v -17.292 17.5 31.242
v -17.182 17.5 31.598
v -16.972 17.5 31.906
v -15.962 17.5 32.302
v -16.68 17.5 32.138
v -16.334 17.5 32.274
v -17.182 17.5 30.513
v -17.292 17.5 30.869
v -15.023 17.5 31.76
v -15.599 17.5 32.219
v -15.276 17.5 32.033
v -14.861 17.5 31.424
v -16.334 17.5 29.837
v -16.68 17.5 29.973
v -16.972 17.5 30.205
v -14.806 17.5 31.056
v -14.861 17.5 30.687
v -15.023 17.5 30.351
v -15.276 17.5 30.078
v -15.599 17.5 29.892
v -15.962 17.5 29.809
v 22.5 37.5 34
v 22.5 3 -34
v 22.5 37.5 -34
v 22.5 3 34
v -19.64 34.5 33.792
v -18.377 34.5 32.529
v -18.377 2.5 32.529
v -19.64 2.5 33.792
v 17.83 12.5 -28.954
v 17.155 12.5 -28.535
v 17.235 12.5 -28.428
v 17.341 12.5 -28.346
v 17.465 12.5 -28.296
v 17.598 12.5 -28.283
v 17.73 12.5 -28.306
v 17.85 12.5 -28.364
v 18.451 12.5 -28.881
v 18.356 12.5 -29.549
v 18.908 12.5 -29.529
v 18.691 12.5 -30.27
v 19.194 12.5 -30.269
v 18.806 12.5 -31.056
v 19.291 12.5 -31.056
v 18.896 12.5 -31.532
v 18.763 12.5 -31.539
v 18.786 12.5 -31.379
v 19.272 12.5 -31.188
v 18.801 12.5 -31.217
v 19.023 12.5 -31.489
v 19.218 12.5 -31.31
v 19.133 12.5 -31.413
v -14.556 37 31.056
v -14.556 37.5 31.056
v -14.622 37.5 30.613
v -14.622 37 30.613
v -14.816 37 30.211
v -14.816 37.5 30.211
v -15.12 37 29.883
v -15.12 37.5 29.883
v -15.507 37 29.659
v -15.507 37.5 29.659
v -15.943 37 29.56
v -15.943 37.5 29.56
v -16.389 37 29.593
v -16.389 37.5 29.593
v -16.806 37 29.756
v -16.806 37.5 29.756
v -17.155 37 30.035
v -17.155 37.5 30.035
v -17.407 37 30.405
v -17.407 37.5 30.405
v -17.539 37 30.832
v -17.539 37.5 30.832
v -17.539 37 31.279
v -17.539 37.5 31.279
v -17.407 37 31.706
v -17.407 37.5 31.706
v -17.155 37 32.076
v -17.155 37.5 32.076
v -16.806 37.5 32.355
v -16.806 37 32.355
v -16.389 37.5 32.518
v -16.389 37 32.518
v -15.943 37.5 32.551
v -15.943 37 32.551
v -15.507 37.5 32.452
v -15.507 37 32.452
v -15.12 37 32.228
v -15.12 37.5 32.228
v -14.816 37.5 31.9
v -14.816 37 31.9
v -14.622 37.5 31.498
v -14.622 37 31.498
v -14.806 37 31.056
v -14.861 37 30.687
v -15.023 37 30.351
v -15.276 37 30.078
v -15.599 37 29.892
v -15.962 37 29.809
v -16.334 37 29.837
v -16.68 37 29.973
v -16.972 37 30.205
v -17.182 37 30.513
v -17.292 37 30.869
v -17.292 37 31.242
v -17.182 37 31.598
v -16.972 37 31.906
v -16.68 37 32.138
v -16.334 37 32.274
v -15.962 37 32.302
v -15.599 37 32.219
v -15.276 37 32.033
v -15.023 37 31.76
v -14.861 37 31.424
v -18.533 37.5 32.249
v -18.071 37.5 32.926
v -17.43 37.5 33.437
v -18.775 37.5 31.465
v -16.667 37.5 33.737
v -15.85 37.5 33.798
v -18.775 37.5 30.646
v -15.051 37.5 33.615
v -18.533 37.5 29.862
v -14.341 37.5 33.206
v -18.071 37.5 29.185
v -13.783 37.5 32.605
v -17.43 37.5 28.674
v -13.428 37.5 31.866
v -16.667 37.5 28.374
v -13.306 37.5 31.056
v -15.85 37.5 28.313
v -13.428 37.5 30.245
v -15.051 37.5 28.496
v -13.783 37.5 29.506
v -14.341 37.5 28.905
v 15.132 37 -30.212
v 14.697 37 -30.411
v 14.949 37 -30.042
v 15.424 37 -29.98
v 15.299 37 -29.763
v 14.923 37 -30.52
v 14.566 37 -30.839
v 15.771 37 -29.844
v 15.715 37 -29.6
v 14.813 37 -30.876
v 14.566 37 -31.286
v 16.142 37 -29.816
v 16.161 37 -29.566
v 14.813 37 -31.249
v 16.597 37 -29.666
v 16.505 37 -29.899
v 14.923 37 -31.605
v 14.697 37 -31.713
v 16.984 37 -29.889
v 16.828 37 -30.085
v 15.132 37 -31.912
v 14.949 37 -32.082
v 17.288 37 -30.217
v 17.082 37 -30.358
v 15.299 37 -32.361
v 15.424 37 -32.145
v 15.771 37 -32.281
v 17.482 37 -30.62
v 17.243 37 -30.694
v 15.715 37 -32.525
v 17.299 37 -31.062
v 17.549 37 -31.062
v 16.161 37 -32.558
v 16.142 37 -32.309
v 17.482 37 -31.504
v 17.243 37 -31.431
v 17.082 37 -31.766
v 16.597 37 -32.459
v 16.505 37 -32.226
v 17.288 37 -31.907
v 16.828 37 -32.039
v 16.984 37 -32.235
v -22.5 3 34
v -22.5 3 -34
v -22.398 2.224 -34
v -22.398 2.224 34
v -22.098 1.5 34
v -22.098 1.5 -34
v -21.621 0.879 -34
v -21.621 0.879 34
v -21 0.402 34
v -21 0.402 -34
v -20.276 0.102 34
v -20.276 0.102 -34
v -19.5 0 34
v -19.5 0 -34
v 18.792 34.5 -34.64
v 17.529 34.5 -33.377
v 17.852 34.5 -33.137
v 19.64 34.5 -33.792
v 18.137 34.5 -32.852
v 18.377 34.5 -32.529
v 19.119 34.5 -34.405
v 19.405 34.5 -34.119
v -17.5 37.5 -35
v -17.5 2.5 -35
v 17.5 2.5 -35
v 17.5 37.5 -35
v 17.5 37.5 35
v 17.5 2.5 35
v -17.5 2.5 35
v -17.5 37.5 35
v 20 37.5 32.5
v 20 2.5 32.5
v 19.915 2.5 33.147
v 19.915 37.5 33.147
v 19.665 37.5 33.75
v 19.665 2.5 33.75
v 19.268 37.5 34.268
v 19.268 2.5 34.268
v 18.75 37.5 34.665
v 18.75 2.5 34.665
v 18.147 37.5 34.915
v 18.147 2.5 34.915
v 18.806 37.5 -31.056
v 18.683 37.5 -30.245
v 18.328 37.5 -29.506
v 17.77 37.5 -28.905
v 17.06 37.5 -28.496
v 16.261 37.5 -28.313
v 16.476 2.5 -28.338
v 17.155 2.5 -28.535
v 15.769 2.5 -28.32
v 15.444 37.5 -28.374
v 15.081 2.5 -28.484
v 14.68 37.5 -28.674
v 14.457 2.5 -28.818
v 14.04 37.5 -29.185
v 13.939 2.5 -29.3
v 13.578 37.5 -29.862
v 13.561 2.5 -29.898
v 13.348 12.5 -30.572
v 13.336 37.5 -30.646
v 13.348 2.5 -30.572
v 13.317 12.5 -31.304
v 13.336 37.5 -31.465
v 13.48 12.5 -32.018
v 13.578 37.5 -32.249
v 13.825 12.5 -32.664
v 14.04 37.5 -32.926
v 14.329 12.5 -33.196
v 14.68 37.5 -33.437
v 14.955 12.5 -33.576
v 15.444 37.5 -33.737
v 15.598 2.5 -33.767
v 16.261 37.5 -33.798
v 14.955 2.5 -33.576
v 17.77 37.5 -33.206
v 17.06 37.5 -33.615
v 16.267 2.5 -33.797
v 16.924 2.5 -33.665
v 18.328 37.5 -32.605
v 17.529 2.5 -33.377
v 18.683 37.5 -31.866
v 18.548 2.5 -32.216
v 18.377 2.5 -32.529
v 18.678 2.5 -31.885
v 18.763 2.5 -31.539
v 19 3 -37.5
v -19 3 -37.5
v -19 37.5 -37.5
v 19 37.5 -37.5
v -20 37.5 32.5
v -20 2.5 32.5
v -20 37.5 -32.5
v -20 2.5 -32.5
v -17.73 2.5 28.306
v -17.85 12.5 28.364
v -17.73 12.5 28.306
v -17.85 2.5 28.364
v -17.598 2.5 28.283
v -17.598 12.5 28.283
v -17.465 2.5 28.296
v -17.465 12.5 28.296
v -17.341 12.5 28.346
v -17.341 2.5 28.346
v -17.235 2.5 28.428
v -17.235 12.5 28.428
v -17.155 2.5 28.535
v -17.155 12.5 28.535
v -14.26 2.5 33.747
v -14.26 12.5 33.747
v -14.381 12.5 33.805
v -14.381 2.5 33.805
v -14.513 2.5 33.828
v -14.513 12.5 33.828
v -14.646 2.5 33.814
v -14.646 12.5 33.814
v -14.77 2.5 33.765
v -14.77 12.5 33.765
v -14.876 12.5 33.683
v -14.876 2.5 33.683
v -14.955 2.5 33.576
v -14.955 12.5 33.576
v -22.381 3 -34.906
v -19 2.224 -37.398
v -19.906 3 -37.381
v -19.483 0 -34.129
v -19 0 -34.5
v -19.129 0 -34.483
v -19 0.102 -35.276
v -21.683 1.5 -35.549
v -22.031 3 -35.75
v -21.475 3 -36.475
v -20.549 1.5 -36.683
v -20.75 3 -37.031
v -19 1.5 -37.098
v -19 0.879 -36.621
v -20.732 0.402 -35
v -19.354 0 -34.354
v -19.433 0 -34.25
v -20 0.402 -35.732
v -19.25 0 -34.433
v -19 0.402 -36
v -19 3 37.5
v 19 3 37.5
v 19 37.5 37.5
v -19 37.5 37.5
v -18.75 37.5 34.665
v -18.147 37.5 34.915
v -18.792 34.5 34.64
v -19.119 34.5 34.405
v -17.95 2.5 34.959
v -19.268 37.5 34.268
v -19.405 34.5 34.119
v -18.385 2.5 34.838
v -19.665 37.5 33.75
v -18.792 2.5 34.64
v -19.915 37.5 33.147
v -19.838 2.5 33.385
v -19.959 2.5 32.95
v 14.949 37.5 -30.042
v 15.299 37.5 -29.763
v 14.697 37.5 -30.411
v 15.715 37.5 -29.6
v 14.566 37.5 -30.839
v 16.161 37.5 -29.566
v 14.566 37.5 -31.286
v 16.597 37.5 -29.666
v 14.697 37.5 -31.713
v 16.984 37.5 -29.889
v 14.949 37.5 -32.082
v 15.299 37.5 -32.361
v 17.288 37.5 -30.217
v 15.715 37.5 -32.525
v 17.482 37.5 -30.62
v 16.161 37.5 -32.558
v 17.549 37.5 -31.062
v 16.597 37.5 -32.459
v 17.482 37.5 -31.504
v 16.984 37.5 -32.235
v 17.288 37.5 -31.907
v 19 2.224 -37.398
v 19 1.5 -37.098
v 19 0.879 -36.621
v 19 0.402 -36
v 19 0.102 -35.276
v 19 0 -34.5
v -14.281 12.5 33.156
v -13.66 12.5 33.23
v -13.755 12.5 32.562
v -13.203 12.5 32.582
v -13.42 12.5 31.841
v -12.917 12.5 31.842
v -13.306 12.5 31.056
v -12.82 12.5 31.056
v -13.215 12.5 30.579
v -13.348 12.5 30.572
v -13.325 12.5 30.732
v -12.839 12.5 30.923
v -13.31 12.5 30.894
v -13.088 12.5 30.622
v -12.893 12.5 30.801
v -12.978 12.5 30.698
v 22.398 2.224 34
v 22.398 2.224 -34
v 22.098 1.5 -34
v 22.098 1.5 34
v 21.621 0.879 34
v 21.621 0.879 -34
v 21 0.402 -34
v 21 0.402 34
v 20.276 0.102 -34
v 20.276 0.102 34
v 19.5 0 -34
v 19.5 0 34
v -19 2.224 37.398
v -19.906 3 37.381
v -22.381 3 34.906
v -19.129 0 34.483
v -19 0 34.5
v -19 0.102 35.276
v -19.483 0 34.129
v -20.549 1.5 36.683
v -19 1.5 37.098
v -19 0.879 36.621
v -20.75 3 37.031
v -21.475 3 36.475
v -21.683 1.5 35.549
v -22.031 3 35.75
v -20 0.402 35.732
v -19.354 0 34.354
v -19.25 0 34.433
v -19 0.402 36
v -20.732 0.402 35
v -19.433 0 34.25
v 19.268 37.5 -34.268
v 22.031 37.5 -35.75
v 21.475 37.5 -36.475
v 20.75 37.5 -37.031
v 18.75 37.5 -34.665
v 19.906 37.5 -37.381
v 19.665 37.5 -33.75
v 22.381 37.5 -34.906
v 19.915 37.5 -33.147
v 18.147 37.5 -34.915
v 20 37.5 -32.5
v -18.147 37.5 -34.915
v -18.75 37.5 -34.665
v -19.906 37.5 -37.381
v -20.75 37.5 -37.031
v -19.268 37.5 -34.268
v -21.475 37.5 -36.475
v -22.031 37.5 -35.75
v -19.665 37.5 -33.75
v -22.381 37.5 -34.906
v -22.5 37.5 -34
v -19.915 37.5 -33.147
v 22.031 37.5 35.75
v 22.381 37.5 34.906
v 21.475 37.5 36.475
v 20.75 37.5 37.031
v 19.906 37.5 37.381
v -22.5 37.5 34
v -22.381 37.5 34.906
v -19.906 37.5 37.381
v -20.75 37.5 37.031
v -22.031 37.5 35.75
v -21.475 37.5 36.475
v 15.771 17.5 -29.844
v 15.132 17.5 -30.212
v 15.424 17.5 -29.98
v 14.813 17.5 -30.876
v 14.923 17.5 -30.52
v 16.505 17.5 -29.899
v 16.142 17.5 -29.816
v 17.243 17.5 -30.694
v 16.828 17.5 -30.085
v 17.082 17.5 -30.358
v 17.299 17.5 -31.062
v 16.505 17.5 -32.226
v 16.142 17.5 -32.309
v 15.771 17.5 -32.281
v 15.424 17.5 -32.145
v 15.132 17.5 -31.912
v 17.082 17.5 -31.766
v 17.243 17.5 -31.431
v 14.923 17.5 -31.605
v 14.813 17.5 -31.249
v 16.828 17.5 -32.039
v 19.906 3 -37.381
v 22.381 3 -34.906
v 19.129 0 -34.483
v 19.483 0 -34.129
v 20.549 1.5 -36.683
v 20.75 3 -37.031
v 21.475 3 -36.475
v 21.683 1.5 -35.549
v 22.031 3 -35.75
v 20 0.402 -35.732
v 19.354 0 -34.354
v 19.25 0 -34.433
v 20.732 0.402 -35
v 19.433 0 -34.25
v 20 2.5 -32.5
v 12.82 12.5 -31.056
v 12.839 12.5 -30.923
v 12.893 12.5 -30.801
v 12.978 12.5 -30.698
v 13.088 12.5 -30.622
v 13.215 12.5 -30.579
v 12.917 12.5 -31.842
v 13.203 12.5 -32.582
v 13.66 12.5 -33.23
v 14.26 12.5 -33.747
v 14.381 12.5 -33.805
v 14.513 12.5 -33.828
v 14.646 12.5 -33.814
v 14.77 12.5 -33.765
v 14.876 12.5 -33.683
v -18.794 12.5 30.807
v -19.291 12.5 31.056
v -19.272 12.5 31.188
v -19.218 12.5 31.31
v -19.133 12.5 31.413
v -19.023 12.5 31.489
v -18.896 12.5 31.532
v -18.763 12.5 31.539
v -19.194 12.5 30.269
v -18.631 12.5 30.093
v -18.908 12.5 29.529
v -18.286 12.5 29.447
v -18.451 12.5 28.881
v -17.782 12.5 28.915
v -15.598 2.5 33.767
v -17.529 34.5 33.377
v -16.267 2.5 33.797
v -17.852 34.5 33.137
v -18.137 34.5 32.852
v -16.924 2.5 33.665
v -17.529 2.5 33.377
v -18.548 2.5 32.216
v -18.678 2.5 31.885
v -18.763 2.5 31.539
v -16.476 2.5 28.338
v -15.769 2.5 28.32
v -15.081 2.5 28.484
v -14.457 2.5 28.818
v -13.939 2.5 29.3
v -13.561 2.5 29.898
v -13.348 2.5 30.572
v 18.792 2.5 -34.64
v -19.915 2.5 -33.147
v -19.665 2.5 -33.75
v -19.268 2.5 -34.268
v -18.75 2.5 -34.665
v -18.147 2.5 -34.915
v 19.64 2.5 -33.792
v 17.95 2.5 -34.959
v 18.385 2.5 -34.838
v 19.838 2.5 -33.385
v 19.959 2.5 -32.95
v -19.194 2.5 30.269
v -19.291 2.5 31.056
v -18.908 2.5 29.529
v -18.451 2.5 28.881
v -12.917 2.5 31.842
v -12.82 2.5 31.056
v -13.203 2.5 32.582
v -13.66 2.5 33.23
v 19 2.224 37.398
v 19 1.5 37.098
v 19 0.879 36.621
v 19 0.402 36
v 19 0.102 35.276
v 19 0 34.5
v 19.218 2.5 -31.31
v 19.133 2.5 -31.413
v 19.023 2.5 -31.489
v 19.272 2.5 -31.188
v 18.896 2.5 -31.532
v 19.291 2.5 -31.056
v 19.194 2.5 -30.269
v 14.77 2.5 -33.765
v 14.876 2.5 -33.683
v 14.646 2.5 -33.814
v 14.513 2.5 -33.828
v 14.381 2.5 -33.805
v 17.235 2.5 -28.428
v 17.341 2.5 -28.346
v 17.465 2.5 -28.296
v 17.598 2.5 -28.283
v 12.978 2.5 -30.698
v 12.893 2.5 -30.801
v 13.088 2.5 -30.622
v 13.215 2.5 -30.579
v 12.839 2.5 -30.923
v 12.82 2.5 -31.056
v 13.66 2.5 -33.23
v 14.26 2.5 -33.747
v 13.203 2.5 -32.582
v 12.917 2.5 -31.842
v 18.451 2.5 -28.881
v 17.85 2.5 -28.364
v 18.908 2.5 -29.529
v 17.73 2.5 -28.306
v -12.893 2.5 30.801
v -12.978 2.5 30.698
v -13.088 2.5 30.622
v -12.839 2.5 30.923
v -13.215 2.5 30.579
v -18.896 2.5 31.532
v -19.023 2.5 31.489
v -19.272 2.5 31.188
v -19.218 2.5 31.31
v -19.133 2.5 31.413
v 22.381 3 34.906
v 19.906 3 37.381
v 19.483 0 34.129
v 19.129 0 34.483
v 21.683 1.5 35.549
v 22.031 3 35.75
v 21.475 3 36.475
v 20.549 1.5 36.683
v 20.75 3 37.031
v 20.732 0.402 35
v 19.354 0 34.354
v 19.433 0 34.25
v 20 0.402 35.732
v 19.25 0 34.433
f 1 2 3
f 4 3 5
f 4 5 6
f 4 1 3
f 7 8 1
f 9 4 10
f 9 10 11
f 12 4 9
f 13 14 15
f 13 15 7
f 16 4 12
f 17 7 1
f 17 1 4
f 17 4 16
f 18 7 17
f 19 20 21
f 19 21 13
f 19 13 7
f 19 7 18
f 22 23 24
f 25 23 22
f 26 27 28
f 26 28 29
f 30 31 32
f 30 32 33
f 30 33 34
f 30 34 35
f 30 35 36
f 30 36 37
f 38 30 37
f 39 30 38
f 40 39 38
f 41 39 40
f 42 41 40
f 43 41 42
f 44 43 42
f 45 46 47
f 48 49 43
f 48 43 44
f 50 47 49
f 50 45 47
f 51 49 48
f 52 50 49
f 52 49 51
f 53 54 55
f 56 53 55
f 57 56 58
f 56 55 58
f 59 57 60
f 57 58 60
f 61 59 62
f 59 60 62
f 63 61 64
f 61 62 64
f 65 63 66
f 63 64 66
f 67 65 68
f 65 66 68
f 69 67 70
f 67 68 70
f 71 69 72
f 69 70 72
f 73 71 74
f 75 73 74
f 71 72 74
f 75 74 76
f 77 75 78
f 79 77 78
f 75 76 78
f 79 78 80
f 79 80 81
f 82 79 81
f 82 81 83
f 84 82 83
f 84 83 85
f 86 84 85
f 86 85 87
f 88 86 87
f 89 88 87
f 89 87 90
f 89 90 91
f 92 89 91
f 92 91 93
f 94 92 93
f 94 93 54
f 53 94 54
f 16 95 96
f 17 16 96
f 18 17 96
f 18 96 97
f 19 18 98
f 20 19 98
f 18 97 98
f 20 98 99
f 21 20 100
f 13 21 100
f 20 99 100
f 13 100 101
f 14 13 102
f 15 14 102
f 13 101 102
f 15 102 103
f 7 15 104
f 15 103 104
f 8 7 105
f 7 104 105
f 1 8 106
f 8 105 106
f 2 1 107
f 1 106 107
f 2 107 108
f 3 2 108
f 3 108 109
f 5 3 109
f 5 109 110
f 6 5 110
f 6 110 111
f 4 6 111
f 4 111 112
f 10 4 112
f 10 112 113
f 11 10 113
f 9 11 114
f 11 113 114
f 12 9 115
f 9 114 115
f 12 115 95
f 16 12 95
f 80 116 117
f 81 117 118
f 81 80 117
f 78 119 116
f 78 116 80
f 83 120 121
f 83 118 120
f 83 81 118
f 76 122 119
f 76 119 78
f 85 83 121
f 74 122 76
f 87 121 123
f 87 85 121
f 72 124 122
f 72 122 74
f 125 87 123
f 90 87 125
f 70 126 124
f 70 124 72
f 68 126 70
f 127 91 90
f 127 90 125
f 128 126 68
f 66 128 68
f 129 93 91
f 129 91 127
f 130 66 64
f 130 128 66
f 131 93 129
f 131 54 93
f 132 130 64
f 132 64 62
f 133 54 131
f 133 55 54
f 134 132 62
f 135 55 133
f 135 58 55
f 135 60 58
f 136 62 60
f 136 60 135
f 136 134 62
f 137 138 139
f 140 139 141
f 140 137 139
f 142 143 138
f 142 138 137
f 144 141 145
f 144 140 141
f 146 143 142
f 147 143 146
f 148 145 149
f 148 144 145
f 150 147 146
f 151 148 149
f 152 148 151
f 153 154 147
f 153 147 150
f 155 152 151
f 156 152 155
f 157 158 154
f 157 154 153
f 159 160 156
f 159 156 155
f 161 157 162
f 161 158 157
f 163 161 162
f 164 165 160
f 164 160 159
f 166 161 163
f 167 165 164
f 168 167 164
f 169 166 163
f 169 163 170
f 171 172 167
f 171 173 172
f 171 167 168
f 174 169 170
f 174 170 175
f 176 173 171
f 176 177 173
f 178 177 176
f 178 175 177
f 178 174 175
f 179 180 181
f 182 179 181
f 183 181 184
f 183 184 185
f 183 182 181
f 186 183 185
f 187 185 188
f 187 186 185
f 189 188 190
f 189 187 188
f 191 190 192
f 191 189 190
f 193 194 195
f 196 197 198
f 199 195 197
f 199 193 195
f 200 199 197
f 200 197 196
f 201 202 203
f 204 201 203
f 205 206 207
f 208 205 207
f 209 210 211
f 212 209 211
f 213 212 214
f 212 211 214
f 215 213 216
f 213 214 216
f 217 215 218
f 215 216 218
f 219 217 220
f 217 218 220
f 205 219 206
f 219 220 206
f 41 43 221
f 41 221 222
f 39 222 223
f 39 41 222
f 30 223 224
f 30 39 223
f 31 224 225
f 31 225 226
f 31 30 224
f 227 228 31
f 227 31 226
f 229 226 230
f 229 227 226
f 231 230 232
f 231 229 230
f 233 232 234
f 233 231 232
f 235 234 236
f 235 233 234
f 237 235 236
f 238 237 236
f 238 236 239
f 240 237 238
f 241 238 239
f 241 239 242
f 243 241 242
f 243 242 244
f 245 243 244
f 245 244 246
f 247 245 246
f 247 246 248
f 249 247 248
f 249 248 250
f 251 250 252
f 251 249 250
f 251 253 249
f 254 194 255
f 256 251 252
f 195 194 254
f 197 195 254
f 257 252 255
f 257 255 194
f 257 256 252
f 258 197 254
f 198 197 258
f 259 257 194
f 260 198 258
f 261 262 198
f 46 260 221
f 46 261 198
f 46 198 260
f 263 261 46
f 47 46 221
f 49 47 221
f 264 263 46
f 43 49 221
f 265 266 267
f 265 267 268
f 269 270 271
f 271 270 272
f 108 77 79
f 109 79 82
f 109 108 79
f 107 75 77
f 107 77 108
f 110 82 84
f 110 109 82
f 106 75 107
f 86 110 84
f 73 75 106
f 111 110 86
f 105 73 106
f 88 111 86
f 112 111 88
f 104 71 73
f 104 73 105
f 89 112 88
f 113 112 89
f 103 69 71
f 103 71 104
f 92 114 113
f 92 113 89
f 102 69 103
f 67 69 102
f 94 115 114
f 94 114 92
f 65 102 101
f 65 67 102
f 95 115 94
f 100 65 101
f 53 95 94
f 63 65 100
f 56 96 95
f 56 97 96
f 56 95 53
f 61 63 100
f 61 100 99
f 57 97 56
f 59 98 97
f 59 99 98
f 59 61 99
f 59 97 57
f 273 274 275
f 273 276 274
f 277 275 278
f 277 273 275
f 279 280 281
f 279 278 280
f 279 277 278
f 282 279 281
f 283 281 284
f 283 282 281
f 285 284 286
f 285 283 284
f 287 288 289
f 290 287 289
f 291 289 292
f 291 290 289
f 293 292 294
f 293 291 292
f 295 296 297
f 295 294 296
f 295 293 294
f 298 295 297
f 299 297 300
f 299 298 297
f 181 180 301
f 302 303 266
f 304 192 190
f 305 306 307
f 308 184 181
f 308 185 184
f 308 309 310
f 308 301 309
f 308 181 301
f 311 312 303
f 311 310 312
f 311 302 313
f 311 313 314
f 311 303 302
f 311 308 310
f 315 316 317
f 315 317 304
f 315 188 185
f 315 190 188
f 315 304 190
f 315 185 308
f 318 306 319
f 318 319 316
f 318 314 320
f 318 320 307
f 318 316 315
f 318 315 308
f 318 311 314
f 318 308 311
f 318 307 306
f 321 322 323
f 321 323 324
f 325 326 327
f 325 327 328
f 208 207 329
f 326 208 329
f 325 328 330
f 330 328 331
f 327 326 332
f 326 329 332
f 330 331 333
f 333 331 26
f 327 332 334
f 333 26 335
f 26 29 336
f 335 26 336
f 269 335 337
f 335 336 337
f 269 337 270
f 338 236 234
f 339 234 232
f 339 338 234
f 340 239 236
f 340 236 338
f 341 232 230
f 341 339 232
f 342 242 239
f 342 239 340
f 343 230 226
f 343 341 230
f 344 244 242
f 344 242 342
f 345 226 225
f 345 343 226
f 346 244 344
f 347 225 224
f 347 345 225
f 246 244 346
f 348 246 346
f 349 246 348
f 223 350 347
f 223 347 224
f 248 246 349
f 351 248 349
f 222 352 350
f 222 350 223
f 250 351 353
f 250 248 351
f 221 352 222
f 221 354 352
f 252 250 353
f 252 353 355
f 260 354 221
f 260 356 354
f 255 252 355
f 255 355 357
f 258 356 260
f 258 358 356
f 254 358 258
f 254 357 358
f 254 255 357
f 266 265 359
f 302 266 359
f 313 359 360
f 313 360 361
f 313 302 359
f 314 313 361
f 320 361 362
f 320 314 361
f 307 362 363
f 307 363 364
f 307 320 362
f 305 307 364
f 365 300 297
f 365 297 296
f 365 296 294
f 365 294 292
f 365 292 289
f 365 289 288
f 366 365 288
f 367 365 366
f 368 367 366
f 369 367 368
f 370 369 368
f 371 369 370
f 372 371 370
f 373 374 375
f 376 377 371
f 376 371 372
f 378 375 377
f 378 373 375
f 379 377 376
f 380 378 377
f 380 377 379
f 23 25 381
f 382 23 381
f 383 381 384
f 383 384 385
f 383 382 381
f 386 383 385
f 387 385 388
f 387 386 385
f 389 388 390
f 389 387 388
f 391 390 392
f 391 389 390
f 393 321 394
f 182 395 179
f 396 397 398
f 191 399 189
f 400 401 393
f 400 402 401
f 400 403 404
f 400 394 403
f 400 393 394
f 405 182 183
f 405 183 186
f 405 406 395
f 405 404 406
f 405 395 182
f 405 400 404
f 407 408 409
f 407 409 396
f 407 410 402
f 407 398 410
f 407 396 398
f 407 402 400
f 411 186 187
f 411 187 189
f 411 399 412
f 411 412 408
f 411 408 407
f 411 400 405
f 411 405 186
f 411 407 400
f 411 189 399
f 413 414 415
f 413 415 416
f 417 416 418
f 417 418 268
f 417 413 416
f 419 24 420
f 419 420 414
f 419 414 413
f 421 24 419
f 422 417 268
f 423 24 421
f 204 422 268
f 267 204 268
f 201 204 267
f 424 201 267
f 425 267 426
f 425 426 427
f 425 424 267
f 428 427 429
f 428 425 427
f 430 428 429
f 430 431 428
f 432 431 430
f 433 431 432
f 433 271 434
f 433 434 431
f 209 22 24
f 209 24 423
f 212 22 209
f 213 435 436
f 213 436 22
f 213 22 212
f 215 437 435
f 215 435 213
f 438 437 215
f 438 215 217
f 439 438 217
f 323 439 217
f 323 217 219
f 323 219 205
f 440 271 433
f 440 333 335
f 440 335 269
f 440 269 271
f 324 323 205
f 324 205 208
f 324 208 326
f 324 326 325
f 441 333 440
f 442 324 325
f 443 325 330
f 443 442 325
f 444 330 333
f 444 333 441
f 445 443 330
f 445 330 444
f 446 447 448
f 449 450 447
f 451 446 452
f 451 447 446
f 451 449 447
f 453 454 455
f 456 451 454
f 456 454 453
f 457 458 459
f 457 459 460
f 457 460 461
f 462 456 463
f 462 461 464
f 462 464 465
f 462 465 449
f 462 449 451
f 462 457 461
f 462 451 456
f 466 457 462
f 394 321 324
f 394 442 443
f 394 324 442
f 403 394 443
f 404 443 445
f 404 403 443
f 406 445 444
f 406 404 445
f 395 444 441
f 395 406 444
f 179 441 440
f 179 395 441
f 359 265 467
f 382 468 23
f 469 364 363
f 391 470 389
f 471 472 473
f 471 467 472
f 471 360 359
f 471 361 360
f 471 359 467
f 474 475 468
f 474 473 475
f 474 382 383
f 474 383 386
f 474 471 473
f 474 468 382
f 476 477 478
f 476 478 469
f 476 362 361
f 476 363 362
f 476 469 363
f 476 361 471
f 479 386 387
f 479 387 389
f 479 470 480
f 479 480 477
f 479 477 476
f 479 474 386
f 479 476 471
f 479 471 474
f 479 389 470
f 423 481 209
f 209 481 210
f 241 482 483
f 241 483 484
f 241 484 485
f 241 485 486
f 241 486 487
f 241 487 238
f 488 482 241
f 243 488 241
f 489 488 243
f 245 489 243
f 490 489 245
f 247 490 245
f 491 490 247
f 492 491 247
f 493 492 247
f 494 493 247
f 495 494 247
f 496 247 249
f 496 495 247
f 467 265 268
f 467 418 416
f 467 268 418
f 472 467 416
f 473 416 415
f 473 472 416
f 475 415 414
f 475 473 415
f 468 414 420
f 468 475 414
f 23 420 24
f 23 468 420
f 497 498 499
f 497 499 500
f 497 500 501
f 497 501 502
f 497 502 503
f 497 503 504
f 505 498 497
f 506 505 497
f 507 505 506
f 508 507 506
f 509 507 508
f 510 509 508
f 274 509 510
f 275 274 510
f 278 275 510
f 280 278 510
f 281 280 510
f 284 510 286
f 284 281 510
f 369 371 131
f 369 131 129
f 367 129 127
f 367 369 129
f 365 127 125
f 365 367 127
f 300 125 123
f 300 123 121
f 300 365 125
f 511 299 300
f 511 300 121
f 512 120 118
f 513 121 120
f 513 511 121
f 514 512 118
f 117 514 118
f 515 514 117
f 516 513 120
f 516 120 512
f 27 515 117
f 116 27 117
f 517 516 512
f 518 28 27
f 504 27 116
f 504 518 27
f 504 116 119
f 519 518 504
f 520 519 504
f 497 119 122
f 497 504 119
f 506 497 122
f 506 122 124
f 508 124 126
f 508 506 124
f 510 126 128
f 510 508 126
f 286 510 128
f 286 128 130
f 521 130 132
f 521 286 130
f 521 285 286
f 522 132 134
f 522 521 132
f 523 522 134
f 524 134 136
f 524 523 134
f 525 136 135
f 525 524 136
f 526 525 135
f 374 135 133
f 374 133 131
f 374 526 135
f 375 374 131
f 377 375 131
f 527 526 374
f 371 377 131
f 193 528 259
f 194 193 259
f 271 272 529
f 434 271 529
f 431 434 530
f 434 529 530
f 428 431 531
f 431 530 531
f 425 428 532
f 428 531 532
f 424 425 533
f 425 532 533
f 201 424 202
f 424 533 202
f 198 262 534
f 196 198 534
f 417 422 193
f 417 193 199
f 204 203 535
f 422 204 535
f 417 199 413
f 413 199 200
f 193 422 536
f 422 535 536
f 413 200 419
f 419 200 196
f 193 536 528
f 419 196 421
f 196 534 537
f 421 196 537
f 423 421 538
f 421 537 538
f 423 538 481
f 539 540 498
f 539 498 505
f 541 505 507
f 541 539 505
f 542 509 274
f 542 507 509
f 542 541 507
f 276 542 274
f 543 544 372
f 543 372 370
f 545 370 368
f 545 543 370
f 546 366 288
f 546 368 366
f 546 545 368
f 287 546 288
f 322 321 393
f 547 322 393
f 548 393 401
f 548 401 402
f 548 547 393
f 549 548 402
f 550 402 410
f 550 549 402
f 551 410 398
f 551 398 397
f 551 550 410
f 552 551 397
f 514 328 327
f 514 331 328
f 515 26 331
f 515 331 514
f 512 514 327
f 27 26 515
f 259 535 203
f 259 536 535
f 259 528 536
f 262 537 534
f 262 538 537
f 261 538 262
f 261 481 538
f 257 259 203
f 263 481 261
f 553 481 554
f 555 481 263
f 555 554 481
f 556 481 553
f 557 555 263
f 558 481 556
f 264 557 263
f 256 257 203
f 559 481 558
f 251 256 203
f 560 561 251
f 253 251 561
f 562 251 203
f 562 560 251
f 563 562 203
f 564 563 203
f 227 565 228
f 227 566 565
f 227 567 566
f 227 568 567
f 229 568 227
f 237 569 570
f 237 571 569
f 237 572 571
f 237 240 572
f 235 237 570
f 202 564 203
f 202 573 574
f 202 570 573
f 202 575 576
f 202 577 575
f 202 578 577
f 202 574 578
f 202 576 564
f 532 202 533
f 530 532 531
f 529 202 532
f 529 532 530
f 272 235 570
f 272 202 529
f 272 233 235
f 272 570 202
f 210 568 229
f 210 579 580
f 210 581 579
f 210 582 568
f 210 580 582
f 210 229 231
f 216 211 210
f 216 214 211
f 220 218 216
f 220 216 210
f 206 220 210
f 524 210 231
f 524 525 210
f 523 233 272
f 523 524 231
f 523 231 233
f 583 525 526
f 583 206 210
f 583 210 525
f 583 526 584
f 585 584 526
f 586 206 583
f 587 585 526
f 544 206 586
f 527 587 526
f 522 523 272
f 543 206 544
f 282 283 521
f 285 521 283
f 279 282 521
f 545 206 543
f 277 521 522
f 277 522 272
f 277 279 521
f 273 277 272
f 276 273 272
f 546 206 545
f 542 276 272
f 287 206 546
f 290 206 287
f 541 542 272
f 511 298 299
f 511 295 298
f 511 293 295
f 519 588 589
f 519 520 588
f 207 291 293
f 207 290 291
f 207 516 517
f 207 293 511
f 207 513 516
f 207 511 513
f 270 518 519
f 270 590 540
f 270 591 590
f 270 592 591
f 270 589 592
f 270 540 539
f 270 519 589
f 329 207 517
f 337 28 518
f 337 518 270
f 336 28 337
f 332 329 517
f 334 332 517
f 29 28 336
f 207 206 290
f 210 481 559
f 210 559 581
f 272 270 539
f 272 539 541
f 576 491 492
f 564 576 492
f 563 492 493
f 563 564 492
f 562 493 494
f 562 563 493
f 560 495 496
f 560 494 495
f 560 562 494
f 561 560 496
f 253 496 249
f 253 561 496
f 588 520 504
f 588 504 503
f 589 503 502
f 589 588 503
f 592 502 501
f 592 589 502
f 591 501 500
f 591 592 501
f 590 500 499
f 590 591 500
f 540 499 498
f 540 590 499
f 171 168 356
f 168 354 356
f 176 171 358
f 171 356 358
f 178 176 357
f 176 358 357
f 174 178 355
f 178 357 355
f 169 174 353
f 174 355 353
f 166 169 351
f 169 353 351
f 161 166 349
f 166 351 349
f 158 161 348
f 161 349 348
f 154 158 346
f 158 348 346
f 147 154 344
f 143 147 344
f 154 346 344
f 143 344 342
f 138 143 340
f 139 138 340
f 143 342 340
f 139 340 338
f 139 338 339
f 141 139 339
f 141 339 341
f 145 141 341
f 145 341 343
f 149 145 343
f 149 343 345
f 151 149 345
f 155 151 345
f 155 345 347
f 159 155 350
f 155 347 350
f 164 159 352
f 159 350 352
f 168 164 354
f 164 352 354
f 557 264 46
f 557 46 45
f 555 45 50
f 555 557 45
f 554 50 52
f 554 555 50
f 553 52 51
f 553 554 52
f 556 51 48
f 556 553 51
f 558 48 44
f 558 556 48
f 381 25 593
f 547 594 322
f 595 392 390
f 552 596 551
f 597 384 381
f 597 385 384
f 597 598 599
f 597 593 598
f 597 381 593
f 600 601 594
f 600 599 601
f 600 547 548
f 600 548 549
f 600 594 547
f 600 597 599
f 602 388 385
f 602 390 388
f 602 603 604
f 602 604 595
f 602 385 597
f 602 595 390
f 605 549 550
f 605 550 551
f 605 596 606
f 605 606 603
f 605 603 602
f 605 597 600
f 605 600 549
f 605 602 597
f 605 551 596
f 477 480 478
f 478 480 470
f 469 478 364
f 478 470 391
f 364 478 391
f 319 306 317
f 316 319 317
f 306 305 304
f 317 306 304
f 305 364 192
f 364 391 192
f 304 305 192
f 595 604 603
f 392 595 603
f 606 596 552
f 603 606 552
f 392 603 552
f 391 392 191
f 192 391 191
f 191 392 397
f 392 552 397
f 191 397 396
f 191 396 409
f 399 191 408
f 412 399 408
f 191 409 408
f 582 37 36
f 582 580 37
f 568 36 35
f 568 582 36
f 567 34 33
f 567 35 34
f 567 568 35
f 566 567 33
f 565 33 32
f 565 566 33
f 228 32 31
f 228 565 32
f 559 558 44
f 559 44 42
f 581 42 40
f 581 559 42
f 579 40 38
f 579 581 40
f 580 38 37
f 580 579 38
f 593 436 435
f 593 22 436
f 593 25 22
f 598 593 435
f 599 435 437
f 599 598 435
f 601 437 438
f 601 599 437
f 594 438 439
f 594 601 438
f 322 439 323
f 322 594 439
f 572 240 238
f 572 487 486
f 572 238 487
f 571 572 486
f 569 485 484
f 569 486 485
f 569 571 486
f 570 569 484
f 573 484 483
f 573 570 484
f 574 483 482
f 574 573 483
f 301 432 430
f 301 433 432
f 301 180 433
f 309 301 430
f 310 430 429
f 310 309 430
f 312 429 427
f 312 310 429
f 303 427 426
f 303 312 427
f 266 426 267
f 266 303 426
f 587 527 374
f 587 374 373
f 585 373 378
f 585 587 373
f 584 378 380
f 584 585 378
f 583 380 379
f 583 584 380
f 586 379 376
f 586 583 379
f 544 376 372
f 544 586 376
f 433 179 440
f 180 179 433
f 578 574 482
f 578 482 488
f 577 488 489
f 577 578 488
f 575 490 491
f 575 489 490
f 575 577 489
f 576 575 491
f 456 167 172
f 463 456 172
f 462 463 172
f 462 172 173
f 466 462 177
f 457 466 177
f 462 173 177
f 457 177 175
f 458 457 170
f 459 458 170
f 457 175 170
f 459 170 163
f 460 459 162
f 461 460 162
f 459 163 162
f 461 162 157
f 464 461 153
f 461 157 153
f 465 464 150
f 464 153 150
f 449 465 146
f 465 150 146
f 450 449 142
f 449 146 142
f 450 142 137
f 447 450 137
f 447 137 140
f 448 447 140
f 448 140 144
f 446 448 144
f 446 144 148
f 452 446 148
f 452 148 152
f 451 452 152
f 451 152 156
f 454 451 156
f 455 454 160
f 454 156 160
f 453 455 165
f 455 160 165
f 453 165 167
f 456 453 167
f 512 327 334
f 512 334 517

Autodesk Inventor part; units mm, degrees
ref_plane "YZ Plane" through (0, 0, 0) normal (1, 0, 0) x (0, 1, 0)
ref_plane "XZ Plane" through (0, 0, 0) normal (0, 1, 0) x (-1, 0, 0)
ref_plane "XY Plane" through (0, 0, 0) normal (0, 0, 1) x (1, 0, 0)
sketch "Sketch1" plane through (0, 0, 0) normal (0, 1, 0) x (-1, 0, 0)
  line L0 (-22.5, 37.5) -> (22.5, 37.5)
  line L1 (22.5, 37.5) -> (22.5, -37.5)
  line L2 (22.5, -37.5) -> (-22.5, -37.5)
  line L3 (-22.5, -37.5) -> (-22.5, 37.5)
  line L4 (22.5, 37.5) -> (-22.5, -37.5) construction
  line L5 (-20, 35) -> (20, 35)
  line L6 (20, 35) -> (20, -35)
  line L7 (20, -35) -> (-20, -35)
  line L8 (-20, -35) -> (-20, 35)
  line L9 (20, 35) -> (-20, -35) construction
  line L10 (20, 35) -> (17.5, 35)
  line L11 (17.5, 35) -> (17.5, 32.5)
  line L12 (17.5, 32.5) -> (20, 32.5)
  line L13 (20, 32.5) -> (20, 35)
  arc A0 (20, 32.5) -> (17.5, 35) centre (17.5, 32.5) ccw
  line L14 (22.5, 37.5) -> (19, 37.5)
  line L15 (19, 37.5) -> (19, 34)
  line L16 (19, 34) -> (22.5, 34)
  line L17 (22.5, 34) -> (22.5, 37.5)
  line L18 (20, -35) -> (17.5, -35)
  line L19 (17.5, -35) -> (17.5, -32.5)
  line L20 (17.5, -32.5) -> (20, -32.5)
  line L21 (20, -32.5) -> (20, -35)
  line L22 (-20, -35) -> (-17.5, -35)
  line L23 (-17.5, -35) -> (-17.5, -32.5)
  line L24 (-17.5, -32.5) -> (-20, -32.5)
  line L25 (-20, -32.5) -> (-20, -35)
  line L26 (-20, 35) -> (-17.5, 35)
  line L27 (-17.5, 35) -> (-17.5, 32.5)
  line L28 (-17.5, 32.5) -> (-20, 32.5)
  line L29 (-20, 32.5) -> (-20, 35)
  arc A1 (-17.5, 35) -> (-20, 32.5) centre (-17.5, 32.5) ccw
  arc A2 (-20, -32.5) -> (-17.5, -35) centre (-17.5, -32.5) ccw
  arc A3 (17.5, -35) -> (20, -32.5) centre (17.5, -32.5) ccw
  arc A4 (22.5, 34) -> (19, 37.5) centre (19, 34) ccw
  line L30 (22.5, -37.5) -> (19, -37.5)
  line L31 (19, -37.5) -> (19, -34)
  line L32 (19, -34) -> (22.5, -34)
  line L33 (22.5, -34) -> (22.5, -37.5)
  line L34 (-22.5, -37.5) -> (-19, -37.5)
  line L35 (-19, -37.5) -> (-19, -34)
  line L36 (-19, -34) -> (-22.5, -34)
  line L37 (-22.5, -34) -> (-22.5, -37.5)
  line L38 (-22.5, 37.5) -> (-19, 37.5)
  line L39 (-19, 37.5) -> (-19, 34)
  line L40 (-19, 34) -> (-22.5, 34)
  line L41 (-22.5, 34) -> (-22.5, 37.5)
  arc A5 (-19, 37.5) -> (-22.5, 34) centre (-19, 34) ccw
  arc A6 (-22.5, -34) -> (-19, -37.5) centre (-19, -34) ccw
  arc A7 (19, -37.5) -> (22.5, -34) centre (19, -34) ccw
  point P0 (0, 0)
  point P1 (-19.5, -34)
  point P2 (-20, -34)
  dimension "d0" = 45
  dimension "d1" = 75
  dimension "d2" = 40
  dimension "d3" = 70
  dimension "d8" = 2.5
  dimension "d9" = 2.5
extrude "Extrusion3" add sketch "Sketch1" along normal blind 2.5 contours L0 L15 L5 L39 | L39 L5 L8 L40 A5 | L40 L8 L36 L3 | A4 L16 L6 L5 L15 | L39 A1 L40 L8 L5 | L5 A1 L39 | L36 L8 L7 L35 A6 | L40 A1 L8 | L15 A0 L5 | L5 L6 L16 A0 L15 | L1 L32 L6 L16 | L5 L11 L12 L6 L20 L19 L7 L23 L24 L8 L28 L27 | L27 L28 A1 L40 L39 | L39 L40 A1 | L36 A2 L35 L7 L8 | L35 L7 L31 L2 | A0 L15 L16 L12 L11 | A0 L16 L15 | A7 L31 L7 L6 L32 | L6 A0 L16 | L24 L23 A2 L35 L36 | L36 L35 A2 | L35 A2 L7 | L32 A3 L6 | L6 L7 L31 A3 L32 | L7 A3 L31 | A3 L32 L31 L19 L20 | A3 L31 L32
extrude "Extrusion4" add sketch "Sketch1" along normal blind 37.5 contours L0 L15 L5 L39 | L39 L5 L8 L40 A5 | L40 L8 L36 L3 | A4 L16 L6 L5 L15 | L39 A1 L40 L8 L5 | L5 A1 L39 | L36 L8 L7 L35 A6 | L40 A1 L8 | L15 A0 L5 | L5 L6 L16 A0 L15 | L1 L32 L6 L16 | L36 A2 L35 L7 L8 | L8 A2 L36 | L35 L7 L31 L2 | A7 L31 L7 L6 L32 | L6 A0 L16 | L35 A2 L7 | L32 A3 L6 | L6 L7 L31 A3 L32 | L7 A3 L31
fillet "Fillet1" radius 3 8 edges at (-21.4749, 0, 36.4749) (0, 0, 37.5) (21.4749, 0, 36.4749) (22.5, 0, 0) (21.4749, 0, -36.4749) (0, 0, -37.5) (-21.4749, 0, -36.4749) (-22.5, 0, 0)
sketch "Sketch2" plane through (0, 2.5, 0) normal (0, 1, 0) x (1, 0, 0)
  arc A0 (20, 32.5) -> (17.5, 35) centre (17.5, 32.5) ccw projected
  line L0 (17.5, 35) -> (17.5, 33.5)
  line L1 (20, -32.5) -> (20, 32.5) projected
  line L2 (20, 32.5) -> (18.5, 32.5)
  line L3 (18.5, 32.5) -> (17.5, 33.5)
  line L4 (18, 33) -> (16.0555, 31.0555)
  circle A1 centre (16.0555, 31.0555) radius 2.75
  line L5 (-20, 32.5) -> (-20, -32.5) projected
  line L6 (-20, -32.5) -> (-18.5, -32.5)
  line L7 (-17.5, -35) -> (17.5, -35) projected
  line L8 (-17.5, -35) -> (-17.5, -33.5)
  line L9 (-17.5, -33.5) -> (-18.5, -32.5)
  line L10 (-18, -33) -> (-16.0555, -31.0555)
  line L11 (-18, -33) -> (-15.25, -33) construction
  circle A2 centre (-16.0555, -31.0555) radius 2.75
  arc A3 (17.5812, 28.7675) -> (18.8055, 31.0555) centre (16.0555, 31.0555) ccw construction
  arc A4 (17.8504, 28.3639) -> (19.2906, 31.0555) centre (16.0555, 31.0555) ccw
  arc A5 (17.3121, 29.1712) -> (18.3203, 31.0555) centre (16.0555, 31.0555) ccw
  arc A6 (17.3121, 29.1712) -> (17.8504, 28.3639) centre (17.5812, 28.7675) ccw
  arc A7 (19.2906, 31.0555) -> (18.3203, 31.0555) centre (18.8055, 31.0555) ccw
  arc A8 (14.2605, 33.747) -> (12.8203, 31.0555) centre (16.0555, 31.0555) ccw
  arc A9 (12.8203, 31.0555) -> (13.7906, 31.0555) centre (13.3055, 31.0555) ccw
  arc A10 (14.7989, 32.9398) -> (14.2605, 33.747) centre (14.5297, 33.3434) ccw
  arc A11 (14.7989, 32.9398) -> (13.7906, 31.0555) centre (16.0555, 31.0555) ccw
  arc A12 (-14.2605, -33.747) -> (-12.8203, -31.0555) centre (-16.0555, -31.0555) ccw
  arc A13 (-14.7989, -32.9398) -> (-13.7906, -31.0555) centre (-16.0555, -31.0555) ccw
  arc A14 (-14.7989, -32.9398) -> (-14.2605, -33.747) centre (-14.5297, -33.3434) ccw
  arc A15 (-12.8203, -31.0555) -> (-13.7906, -31.0555) centre (-13.3055, -31.0555) ccw
  arc A16 (-17.8504, -28.3639) -> (-19.2906, -31.0555) centre (-16.0555, -31.0555) ccw
  arc A17 (-19.2906, -31.0555) -> (-18.3203, -31.0555) centre (-18.8055, -31.0555) ccw
  arc A18 (-17.3121, -29.1712) -> (-17.8504, -28.3639) centre (-17.5812, -28.7675) ccw
  arc A19 (-17.3121, -29.1712) -> (-18.3203, -31.0555) centre (-16.0555, -31.0555) ccw
  line L12 (-19.2843, -34.2843) -> (-16.7157, -31.7157) construction
  line L13 (-18.86, -34.7085) -> (-16.2915, -32.14)
  line L14 (-17.14, -31.2915) -> (-19.7085, -33.86)
  arc A20 (-19.7085, -33.86) -> (-18.86, -34.7085) centre (-19.2843, -34.2843) ccw
  arc A21 (-16.2915, -32.14) -> (-17.14, -31.2915) centre (-16.7157, -31.7157) ccw
  line L15 (16.5205, 31.5205) -> (19.4795, 34.4795) construction
  line L16 (16.9448, 31.0962) -> (19.9038, 34.0552)
  line L17 (19.0552, 34.9038) -> (16.0962, 31.9448)
  arc A22 (16.0962, 31.9448) -> (16.9448, 31.0962) centre (16.5205, 31.5205) ccw
  arc A23 (19.9038, 34.0552) -> (19.0552, 34.9038) centre (19.4795, 34.4795) ccw
  point P0 (0, 0)
  point P1 (18.3774, 32.5289)
  point P2 (17.5289, 33.3774)
  point P3 (14.9555, 33.5759)
  point P4 (13.3482, 30.5722)
  point P5 (17.1554, 28.535)
  point P6 (18.7627, 31.5387)
  point P7 (-18.3774, -32.5289)
  point P8 (-17.5289, -33.3774)
  point P9 (-14.9555, -33.5759)
  point P10 (-13.3482, -30.5722)
  point P11 (-17.1554, -28.535)
  point P12 (-18.7627, -31.5387)
  point P13 (18.7918, 34.6404)
  point P14 (19.6404, 33.7918)
  dimension "d32" = 5.5
  dimension "d29" = 1.5
  dimension "d30" = 1.5
  dimension "d31" = 2.75
  dimension "d33" = 1.5
  dimension "d34" = 1.5
  dimension "d35" = 2.75
  dimension "d36" = 45
  dimension "d37" = 5.5
  dimension "d40" = 360
  dimension "d44" = 1.2
  dimension "d45" = 1.2
extrude "Extrusion5" add sketch "Sketch2" along normal blind 35 contours A0 L17 A23 L16 | A1 L16 A22 L4 | L4 A22 L17 A1 | A1 A7 A5 A6 A9 A11 A10 L17 A22 L16 | A1 A6 A5 A7 | A10 A11 A9 A1 | A2 L14 A21 L10 | L10 A21 L13 A2 | L13 A21 L14 A2 A17 A19 A18 A15 A13 A14 | A14 A13 A15 A2 | A2 A18 A19 A17
extrude "Extrusion6" add sketch "Sketch2" along normal blind 10 contours A7 A4 A6 A1 | A1 A9 A8 A10 | A2 L14 A21 L10 | L10 A21 L13 A2 | L13 A21 L14 A2 A17 A19 A18 A15 A13 A14 | A14 A13 A15 A2 | A2 A15 A12 A14 | A17 A16 A18 A2 | A2 A18 A19 A17
sketch "Sketch3" plane through (0, 37.5, 0) normal (0, 1, 0) x (1, 0, 0)
  arc A0 (-13.3055, -31.0555) -> (-13.3055, -31.0555) centre (-16.0555, -31.0555) ccw projected
  circle A1 centre (-16.0555, -31.0555) radius 1.5
  circle A2 centre (-16.0555, -31.0555) radius 1.25
  circle A3 centre (16.0488, 31.0622) radius 1.5
  circle A4 centre (16.0488, 31.0622) radius 1.25
  point P0 (0, 0)
  dimension "d50" = 3
  dimension "d51" = 2.5
  dimension "d52" = 3
  dimension "d53" = 2.5
extrude "Extrusion7" cut sketch "Sketch3" against normal blind 0.5 contours A1 | A3
extrude "Extrusion8" cut sketch "Sketch3" against normal blind 20 contours A2 | A4
extrude "Extrusion9" add sketch "Sketch2" along normal blind 32 contours L16 L3 L17 A0 | L16 A1 L3 | L3 A1 L17 | L13 A20 L14 L9 | L9 A2 L13 | L9 L14 A2
properties part number "proper shit spodnji"
